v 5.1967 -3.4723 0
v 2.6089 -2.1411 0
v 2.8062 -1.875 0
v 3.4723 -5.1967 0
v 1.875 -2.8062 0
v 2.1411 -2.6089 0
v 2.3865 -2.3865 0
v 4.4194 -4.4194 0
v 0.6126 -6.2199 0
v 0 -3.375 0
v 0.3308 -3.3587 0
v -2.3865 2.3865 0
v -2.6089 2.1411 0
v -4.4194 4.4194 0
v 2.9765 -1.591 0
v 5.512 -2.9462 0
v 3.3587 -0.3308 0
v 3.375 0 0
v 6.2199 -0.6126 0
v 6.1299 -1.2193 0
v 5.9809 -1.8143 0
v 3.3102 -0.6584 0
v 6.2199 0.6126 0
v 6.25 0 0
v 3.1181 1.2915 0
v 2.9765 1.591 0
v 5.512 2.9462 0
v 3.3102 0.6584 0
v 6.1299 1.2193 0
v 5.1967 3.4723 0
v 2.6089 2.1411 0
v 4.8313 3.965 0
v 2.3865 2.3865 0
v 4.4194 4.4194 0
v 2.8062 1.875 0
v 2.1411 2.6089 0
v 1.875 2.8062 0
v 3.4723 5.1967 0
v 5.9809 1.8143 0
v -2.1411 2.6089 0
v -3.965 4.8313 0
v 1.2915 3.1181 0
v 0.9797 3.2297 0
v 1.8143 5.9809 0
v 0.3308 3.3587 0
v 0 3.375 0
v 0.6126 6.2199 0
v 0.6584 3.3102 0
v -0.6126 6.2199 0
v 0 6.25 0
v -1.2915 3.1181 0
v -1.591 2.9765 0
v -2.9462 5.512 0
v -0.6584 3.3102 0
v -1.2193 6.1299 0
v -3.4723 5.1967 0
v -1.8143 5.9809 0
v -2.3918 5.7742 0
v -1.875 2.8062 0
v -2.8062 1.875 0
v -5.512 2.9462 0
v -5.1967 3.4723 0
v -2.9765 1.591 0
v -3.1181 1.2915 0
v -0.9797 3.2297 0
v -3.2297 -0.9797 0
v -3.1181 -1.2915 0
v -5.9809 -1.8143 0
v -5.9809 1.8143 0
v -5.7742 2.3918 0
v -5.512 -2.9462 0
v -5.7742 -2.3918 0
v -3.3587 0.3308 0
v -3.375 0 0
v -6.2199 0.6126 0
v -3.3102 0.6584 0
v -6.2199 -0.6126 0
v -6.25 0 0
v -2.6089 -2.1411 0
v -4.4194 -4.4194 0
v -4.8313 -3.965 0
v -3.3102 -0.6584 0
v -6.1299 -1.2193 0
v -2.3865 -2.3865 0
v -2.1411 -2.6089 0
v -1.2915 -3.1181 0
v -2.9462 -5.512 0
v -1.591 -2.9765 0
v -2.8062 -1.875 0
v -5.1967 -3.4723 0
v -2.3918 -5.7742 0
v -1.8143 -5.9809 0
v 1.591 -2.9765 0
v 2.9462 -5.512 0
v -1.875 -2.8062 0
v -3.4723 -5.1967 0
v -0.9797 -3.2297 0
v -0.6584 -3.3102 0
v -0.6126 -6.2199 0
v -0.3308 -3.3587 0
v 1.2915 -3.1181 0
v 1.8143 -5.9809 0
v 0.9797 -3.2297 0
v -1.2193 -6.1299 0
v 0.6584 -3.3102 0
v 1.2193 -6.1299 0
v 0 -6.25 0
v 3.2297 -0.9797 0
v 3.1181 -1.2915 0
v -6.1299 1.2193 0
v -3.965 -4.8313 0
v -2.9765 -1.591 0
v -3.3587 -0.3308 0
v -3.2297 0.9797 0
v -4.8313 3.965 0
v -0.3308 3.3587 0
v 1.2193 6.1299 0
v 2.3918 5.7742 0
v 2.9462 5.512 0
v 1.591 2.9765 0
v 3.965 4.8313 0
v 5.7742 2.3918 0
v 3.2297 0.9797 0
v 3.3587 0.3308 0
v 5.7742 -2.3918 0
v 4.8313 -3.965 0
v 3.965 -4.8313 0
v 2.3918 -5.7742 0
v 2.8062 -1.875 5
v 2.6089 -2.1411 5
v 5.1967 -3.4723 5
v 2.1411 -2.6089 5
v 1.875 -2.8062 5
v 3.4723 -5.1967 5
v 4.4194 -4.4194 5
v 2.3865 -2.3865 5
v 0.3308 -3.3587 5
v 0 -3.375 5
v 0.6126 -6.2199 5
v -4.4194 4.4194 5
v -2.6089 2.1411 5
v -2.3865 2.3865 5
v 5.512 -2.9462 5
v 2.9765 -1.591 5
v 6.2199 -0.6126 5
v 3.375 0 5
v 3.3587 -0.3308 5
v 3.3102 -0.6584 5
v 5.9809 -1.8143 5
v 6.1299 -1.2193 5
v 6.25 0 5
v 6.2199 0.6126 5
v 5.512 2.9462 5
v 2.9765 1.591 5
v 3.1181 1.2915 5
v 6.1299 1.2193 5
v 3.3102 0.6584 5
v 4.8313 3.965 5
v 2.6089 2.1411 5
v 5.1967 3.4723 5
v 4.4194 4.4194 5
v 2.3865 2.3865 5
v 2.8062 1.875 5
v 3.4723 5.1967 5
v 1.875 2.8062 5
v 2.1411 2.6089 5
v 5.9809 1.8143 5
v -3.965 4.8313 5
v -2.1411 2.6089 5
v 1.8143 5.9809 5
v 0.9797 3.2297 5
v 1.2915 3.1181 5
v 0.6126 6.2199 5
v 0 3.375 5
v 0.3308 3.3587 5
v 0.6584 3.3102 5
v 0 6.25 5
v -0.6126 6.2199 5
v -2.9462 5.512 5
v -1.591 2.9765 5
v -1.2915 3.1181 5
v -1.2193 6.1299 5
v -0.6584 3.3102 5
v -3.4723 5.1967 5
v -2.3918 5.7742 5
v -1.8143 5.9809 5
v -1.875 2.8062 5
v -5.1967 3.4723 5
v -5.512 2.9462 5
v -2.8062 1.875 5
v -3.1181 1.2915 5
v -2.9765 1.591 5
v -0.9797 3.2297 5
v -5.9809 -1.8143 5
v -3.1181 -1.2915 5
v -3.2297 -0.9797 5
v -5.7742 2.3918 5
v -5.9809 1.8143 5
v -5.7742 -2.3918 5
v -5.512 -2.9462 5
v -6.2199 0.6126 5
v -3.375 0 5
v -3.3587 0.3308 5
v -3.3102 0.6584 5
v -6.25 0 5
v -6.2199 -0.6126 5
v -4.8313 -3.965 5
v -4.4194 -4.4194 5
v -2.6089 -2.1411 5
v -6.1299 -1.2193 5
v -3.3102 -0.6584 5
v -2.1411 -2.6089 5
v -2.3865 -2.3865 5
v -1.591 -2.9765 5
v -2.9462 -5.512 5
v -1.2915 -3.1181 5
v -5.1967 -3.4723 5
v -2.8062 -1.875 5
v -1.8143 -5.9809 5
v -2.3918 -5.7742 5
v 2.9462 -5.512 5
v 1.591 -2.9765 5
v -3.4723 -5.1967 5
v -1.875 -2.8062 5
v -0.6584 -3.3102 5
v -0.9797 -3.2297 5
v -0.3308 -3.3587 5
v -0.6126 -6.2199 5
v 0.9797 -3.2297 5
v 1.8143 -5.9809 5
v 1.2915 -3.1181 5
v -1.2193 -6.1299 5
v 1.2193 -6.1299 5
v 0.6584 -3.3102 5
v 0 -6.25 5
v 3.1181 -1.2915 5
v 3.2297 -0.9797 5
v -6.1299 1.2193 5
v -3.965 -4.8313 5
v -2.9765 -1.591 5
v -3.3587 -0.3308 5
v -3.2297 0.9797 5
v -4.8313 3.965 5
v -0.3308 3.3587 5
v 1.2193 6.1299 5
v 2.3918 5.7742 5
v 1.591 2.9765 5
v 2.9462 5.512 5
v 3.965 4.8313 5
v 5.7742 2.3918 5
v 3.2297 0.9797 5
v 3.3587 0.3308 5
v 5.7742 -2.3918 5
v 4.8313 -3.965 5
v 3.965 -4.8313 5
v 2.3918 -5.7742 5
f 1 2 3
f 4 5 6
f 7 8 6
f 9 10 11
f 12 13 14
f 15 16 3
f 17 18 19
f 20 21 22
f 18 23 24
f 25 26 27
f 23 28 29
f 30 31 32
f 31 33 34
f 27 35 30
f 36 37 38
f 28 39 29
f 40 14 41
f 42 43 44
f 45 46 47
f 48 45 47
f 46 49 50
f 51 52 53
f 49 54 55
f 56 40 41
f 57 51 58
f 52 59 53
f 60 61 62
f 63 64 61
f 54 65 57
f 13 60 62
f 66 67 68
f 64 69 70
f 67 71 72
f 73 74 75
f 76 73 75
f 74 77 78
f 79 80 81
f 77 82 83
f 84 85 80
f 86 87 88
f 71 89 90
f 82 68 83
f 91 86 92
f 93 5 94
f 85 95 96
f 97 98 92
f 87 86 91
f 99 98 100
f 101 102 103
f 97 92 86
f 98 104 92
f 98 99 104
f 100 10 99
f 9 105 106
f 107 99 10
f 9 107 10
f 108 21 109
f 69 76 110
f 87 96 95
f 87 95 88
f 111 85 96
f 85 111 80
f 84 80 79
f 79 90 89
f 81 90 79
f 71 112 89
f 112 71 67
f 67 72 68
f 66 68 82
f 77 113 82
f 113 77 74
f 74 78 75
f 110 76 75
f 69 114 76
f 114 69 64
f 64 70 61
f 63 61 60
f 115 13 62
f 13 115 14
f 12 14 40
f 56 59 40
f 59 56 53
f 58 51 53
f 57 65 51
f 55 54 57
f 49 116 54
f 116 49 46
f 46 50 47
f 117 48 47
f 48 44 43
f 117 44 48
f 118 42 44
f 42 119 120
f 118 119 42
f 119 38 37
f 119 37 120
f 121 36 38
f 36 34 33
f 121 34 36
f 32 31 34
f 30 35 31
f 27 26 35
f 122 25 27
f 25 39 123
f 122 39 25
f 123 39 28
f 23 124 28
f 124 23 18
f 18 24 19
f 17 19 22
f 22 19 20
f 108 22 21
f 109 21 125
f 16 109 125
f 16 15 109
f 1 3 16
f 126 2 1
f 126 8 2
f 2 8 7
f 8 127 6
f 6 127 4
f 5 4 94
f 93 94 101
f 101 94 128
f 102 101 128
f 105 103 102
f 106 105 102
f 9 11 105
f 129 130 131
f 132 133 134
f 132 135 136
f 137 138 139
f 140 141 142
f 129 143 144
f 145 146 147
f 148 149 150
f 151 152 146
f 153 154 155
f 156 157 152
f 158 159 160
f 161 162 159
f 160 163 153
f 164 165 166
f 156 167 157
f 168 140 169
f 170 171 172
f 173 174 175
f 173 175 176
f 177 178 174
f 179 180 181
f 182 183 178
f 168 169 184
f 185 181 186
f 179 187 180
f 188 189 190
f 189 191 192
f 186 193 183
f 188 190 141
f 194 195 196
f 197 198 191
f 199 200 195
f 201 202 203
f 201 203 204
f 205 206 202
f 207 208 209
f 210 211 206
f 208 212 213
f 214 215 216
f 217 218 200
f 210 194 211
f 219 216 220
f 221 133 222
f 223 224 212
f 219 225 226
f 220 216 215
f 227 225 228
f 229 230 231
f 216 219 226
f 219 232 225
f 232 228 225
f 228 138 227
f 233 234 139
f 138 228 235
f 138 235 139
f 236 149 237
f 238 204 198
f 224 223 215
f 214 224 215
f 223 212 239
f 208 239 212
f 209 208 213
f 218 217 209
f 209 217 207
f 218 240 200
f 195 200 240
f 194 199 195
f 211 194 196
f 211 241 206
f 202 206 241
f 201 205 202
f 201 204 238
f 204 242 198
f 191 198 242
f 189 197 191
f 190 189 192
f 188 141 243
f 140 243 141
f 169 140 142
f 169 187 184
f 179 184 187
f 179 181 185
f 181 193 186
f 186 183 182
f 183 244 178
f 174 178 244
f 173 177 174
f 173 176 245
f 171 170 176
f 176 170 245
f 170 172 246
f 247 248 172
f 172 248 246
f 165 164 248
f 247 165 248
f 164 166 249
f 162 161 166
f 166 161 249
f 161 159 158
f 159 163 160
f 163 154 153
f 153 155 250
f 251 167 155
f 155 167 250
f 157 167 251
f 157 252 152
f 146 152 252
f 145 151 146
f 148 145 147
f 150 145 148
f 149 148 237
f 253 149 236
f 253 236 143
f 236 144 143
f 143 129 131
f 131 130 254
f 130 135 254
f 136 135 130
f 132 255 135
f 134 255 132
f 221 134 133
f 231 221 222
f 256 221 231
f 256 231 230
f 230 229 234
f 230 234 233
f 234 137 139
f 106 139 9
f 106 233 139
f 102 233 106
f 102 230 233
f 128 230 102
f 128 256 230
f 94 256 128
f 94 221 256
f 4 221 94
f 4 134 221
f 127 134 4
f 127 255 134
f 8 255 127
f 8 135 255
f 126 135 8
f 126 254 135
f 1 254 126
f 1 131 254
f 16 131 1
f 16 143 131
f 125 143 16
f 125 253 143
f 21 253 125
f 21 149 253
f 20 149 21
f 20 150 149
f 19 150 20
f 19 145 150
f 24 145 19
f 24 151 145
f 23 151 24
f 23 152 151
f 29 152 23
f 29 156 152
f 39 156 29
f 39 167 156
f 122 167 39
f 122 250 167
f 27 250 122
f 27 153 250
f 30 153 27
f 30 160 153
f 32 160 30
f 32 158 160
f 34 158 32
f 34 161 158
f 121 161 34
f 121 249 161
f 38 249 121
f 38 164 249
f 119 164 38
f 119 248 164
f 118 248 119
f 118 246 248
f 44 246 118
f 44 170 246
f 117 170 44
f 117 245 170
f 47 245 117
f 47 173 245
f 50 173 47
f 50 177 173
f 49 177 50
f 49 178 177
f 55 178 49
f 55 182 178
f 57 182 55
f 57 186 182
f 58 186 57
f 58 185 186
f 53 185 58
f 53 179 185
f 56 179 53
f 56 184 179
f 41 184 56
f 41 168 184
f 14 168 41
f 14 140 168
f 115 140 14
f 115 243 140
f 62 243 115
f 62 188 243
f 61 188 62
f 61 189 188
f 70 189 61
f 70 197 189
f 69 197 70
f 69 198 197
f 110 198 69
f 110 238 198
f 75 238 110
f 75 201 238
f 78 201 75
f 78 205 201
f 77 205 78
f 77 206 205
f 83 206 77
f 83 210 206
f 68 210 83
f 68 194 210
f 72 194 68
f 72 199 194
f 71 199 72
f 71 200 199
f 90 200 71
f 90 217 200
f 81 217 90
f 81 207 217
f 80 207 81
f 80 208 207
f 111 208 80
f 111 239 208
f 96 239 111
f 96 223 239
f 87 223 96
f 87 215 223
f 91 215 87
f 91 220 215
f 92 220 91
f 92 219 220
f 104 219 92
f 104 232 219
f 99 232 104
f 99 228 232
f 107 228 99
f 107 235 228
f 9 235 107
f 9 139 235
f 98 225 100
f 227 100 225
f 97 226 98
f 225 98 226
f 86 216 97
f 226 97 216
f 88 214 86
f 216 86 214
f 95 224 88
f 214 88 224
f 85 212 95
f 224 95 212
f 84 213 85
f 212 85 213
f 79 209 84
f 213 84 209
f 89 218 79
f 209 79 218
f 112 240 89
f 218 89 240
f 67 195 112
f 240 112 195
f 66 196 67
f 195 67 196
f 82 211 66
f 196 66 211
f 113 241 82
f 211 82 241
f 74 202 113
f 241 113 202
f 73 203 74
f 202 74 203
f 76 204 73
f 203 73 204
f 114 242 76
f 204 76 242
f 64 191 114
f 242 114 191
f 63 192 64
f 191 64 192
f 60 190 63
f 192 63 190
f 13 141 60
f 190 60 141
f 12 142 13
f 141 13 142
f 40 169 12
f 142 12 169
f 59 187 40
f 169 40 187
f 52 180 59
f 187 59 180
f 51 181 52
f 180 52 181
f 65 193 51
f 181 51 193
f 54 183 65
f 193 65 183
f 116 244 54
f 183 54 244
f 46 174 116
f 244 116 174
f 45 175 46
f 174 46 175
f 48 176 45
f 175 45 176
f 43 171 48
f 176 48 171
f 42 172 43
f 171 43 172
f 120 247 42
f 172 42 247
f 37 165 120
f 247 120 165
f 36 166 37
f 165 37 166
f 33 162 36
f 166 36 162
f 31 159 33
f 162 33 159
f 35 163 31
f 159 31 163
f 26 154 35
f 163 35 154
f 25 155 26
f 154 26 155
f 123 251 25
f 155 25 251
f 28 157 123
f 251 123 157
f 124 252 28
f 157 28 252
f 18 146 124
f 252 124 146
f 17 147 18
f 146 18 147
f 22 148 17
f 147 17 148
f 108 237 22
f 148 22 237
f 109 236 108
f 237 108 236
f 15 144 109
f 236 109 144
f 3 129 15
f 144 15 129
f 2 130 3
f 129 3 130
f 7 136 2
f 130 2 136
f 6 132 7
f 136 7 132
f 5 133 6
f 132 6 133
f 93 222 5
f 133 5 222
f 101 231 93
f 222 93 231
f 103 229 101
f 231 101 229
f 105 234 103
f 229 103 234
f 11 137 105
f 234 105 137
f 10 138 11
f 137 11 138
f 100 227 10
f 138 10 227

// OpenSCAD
id = 6.75;
od = 12.5;
h = 5;

$fn = 64;

linear_extrude(height=h) difference() {
    circle(d=od);
    circle(d=id);
}
